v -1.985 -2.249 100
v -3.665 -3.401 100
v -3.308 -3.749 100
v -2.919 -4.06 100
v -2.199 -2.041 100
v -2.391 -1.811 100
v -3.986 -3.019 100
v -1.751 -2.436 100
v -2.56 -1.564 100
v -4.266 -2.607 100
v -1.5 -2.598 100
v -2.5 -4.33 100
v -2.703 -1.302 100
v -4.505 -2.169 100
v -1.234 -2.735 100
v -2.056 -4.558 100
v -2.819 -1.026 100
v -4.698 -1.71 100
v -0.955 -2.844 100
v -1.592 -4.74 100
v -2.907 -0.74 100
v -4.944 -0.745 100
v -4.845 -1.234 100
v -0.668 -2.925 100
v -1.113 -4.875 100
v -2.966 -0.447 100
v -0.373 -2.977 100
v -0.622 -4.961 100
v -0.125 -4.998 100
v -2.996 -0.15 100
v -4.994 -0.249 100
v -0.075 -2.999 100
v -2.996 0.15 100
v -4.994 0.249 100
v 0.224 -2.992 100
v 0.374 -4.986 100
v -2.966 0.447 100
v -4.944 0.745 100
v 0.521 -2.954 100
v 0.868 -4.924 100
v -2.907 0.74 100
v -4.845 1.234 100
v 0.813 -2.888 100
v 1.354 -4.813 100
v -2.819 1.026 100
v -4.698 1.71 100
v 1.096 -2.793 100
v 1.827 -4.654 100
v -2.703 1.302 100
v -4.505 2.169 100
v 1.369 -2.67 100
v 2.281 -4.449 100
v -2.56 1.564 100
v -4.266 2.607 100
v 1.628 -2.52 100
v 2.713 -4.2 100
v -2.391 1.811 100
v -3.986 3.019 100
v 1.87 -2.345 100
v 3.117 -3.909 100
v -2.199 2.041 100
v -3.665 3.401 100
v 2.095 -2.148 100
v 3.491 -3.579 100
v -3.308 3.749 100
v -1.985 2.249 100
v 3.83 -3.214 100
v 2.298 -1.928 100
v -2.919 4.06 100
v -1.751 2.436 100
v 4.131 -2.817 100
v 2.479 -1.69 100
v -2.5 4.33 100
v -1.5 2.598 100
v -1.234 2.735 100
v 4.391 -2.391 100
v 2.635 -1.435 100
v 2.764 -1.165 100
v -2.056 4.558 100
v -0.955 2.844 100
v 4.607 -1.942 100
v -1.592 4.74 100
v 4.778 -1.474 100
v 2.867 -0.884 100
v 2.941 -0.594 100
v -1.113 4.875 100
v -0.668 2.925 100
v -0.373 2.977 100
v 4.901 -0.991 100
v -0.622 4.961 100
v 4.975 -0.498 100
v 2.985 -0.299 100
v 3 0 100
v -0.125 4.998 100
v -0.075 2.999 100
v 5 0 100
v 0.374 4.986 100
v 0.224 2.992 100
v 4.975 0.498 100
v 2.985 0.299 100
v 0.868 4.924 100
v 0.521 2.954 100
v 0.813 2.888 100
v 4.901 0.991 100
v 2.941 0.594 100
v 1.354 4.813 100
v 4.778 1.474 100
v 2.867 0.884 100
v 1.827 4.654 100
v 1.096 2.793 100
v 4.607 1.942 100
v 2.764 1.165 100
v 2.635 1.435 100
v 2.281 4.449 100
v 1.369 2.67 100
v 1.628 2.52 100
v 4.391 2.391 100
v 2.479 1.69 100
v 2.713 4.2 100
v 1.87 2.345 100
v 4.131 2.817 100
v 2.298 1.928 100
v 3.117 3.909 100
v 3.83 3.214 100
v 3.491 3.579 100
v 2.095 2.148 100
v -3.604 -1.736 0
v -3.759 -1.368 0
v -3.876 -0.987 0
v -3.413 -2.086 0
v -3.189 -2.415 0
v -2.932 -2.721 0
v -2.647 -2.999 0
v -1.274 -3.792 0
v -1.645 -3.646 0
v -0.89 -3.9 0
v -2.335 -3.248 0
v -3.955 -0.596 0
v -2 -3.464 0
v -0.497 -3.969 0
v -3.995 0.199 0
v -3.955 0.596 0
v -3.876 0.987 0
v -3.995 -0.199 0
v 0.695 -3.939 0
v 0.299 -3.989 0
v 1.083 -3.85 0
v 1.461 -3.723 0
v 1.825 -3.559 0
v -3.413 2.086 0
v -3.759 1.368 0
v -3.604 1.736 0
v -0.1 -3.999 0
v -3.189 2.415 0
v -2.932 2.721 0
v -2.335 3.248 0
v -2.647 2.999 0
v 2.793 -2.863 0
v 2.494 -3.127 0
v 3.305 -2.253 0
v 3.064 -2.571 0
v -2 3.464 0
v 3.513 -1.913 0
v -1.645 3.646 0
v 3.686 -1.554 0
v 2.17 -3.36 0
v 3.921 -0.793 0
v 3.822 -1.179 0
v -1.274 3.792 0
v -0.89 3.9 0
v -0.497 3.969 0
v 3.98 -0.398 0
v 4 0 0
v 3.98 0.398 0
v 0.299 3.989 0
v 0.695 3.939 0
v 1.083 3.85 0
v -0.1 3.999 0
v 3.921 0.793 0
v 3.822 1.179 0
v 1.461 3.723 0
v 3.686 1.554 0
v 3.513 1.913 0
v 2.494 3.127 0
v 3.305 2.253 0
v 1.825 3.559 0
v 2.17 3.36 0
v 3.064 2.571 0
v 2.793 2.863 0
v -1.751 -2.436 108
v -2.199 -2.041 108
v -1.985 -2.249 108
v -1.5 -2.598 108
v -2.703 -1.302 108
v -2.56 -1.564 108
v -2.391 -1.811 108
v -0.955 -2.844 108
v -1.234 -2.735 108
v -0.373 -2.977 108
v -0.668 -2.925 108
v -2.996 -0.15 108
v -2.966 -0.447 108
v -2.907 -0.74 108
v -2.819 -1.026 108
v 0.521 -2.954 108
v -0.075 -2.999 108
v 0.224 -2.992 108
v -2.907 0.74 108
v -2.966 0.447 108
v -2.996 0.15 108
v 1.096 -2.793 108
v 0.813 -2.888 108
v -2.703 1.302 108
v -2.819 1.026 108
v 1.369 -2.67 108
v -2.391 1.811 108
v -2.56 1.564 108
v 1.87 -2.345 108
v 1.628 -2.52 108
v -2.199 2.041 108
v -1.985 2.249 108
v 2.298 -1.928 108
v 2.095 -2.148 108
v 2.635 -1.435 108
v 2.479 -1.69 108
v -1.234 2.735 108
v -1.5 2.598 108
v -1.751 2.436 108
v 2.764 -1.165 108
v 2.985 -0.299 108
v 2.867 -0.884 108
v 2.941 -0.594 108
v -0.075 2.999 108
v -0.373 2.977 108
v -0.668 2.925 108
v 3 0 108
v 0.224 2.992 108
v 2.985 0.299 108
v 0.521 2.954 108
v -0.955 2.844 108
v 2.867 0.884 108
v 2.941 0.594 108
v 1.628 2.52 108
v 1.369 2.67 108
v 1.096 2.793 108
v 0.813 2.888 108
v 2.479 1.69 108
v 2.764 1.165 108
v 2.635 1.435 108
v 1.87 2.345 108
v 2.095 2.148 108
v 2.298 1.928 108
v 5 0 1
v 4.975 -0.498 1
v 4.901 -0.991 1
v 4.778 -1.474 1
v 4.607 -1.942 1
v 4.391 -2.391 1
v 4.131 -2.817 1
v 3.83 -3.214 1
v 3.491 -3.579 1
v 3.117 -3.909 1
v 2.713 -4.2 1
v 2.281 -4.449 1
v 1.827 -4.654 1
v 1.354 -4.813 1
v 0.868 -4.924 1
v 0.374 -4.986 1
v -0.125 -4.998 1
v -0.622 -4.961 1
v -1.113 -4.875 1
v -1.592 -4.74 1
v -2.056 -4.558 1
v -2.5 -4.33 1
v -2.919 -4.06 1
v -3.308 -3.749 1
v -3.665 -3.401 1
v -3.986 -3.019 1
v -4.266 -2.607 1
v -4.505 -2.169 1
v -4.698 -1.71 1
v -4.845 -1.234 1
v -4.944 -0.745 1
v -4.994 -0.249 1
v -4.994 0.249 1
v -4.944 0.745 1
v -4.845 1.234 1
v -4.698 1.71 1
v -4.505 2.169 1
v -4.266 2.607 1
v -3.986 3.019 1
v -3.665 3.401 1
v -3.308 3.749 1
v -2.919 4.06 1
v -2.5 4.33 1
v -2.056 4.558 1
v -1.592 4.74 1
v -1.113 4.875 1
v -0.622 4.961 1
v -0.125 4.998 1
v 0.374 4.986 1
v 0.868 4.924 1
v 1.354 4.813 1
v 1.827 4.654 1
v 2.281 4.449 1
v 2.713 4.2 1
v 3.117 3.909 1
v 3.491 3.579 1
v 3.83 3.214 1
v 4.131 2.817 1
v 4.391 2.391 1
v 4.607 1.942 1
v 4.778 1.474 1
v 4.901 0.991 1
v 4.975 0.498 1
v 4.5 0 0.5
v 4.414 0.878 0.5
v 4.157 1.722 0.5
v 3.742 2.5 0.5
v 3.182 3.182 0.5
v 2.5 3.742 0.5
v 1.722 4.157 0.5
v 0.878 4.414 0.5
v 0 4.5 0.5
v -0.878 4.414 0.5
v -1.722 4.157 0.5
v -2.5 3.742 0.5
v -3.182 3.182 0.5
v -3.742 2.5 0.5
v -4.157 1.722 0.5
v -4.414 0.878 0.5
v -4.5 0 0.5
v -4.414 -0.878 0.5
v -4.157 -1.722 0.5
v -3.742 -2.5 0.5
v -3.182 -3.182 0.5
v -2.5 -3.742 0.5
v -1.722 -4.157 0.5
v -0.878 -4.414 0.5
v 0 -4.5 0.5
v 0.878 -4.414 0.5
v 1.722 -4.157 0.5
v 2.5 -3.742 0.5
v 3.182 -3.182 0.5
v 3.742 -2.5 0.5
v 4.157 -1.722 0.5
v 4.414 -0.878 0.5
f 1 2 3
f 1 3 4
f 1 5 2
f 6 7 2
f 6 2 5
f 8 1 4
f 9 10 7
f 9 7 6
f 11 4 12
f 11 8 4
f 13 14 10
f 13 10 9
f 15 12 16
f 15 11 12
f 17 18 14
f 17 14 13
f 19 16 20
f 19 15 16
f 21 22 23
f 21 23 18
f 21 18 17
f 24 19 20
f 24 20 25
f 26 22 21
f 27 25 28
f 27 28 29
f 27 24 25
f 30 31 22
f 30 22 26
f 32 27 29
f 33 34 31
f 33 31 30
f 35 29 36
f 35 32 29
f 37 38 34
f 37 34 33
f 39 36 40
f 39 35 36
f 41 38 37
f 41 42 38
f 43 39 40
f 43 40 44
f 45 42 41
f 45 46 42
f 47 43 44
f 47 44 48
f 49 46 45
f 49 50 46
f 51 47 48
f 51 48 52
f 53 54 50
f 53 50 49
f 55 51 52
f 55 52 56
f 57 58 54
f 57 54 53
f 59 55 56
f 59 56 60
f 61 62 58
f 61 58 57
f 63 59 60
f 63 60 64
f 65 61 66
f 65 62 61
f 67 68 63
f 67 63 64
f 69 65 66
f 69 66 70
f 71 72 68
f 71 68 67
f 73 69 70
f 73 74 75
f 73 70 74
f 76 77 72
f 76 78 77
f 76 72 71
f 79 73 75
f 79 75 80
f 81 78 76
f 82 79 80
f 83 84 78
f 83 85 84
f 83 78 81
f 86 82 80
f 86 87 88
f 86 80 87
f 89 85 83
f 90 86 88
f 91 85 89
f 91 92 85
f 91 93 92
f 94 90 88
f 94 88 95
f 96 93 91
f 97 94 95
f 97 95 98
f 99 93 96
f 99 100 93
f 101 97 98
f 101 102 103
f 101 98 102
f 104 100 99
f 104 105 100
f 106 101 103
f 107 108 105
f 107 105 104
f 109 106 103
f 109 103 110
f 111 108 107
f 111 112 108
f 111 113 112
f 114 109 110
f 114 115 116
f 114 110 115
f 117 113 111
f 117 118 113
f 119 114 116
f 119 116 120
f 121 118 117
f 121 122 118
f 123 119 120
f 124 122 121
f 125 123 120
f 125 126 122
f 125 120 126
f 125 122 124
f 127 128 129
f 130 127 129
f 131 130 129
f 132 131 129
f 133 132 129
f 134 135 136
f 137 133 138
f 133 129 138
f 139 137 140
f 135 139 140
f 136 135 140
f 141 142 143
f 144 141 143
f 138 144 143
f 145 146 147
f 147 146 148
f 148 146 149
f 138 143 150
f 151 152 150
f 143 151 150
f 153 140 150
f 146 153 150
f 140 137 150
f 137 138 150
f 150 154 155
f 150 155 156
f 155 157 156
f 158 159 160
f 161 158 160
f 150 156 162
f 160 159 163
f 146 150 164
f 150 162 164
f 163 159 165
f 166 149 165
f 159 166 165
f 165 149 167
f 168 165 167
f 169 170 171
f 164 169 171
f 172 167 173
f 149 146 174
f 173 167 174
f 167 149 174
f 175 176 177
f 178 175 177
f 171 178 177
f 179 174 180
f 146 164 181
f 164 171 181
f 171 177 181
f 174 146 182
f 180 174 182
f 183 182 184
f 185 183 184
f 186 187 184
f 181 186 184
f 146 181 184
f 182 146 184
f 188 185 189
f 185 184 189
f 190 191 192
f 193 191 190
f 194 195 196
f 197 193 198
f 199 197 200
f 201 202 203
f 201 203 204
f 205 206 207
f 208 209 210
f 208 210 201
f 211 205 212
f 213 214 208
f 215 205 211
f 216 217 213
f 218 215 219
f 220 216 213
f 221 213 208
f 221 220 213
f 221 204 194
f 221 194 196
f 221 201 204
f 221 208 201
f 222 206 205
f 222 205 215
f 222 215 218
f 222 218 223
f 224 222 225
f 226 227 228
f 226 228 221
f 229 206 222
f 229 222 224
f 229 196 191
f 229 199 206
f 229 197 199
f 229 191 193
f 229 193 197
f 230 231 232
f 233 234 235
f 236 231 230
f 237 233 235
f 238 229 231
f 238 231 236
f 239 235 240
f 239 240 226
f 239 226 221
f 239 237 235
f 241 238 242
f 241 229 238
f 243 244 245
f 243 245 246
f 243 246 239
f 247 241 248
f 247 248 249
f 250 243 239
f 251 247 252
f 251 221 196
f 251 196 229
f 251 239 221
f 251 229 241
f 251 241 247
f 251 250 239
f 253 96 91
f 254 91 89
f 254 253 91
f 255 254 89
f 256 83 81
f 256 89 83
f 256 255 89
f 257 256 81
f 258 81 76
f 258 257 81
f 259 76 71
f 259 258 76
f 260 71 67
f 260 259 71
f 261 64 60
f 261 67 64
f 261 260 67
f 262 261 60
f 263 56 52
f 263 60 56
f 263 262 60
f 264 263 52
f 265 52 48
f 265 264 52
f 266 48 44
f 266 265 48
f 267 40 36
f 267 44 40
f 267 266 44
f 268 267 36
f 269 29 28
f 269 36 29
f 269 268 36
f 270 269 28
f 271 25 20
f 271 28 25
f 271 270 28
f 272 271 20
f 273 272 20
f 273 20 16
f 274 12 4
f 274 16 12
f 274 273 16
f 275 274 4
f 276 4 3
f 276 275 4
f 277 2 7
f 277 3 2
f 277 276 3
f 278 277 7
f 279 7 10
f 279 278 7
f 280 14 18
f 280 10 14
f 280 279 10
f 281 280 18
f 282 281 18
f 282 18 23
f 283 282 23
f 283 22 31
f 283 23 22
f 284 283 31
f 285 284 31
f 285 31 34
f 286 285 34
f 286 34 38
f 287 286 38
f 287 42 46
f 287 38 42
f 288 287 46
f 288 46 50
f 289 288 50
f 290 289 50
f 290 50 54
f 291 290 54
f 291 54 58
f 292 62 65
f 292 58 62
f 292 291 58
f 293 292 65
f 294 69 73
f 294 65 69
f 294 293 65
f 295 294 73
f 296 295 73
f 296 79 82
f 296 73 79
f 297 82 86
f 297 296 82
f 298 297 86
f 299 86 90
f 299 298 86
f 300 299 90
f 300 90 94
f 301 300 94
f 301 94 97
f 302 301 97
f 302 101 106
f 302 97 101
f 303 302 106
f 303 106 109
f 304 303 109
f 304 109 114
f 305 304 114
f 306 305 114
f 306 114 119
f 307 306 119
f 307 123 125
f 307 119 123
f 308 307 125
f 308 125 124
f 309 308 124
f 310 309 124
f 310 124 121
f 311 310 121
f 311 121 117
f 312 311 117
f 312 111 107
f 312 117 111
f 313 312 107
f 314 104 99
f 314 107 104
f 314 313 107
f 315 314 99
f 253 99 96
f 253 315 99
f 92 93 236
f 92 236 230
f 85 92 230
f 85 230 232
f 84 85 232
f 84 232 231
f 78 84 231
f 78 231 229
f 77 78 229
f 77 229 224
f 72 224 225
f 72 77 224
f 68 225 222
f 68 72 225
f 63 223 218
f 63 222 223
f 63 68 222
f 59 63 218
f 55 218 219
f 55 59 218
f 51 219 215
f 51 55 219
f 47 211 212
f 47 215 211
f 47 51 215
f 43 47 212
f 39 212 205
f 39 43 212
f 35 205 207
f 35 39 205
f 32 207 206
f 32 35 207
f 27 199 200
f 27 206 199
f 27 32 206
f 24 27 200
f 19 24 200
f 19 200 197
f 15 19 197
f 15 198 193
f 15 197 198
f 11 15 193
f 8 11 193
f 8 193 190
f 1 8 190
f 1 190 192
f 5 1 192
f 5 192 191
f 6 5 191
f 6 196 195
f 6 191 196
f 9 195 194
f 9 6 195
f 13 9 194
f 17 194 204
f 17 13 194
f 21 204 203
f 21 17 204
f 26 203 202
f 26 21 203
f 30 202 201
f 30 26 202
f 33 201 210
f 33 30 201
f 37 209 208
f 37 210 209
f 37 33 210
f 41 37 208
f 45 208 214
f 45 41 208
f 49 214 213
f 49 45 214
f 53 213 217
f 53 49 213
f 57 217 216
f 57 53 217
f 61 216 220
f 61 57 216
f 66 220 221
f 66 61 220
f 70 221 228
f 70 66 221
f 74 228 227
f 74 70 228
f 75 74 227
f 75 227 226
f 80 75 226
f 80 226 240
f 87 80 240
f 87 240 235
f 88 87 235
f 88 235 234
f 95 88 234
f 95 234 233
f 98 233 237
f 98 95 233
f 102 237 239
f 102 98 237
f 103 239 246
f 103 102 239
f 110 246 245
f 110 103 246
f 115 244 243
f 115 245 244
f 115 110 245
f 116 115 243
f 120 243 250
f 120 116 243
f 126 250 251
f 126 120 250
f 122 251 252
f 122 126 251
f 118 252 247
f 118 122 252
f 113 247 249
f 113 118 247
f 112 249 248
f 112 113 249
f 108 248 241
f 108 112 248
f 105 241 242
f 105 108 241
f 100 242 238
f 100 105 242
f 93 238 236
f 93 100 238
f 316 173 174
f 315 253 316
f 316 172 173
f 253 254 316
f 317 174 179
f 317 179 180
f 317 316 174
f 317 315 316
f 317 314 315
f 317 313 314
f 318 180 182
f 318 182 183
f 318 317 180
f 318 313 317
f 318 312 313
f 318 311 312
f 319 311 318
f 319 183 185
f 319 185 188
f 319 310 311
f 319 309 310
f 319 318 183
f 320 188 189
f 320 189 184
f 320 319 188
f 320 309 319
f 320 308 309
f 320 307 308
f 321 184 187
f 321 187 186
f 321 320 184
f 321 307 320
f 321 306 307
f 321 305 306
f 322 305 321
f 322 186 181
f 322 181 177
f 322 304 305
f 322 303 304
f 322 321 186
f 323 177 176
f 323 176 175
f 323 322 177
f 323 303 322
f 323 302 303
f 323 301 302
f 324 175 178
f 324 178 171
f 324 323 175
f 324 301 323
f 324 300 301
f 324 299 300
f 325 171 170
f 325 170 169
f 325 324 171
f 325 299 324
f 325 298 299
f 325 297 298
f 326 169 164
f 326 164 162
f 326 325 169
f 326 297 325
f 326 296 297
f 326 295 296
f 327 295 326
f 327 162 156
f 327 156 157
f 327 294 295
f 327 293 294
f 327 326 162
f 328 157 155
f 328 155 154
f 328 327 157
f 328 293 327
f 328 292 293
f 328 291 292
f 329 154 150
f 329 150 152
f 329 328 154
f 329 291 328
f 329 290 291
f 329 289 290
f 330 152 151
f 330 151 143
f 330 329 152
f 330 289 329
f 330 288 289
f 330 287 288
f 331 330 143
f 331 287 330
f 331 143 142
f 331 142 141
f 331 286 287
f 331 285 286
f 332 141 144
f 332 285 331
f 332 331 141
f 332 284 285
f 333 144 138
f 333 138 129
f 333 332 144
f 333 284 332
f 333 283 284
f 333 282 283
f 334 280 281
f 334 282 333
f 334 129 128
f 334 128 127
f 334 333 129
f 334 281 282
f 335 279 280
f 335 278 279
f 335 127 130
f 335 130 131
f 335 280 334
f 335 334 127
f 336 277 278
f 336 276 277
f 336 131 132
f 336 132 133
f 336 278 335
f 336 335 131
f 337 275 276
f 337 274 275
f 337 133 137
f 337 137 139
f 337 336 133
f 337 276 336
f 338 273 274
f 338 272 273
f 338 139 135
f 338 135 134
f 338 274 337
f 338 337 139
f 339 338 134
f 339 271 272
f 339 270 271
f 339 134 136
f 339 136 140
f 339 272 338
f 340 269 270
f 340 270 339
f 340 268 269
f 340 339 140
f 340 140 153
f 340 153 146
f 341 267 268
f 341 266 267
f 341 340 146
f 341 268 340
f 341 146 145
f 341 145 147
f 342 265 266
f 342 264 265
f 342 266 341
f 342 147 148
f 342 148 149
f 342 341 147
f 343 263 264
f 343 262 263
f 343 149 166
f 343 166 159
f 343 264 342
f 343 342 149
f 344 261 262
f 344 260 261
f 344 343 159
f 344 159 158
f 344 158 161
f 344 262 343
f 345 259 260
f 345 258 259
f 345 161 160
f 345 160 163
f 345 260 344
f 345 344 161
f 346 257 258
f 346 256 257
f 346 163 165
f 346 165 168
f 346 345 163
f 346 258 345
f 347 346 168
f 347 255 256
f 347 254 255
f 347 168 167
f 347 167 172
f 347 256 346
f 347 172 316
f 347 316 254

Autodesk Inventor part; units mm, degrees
ref_plane "YZ Plane" through (0, 0, 0) normal (1, 0, 0) x (0, 1, 0)
ref_plane "XZ Plane" through (0, 0, 0) normal (0, 1, 0) x (-1, 0, 0)
ref_plane "XY Plane" through (0, 0, 0) normal (0, 0, 1) x (1, 0, 0)
sketch "Sketch1" plane through (0, 0, 0) normal (0, 0, 1) x (1, 0, 0)
  circle A0 centre (0, 0) radius 5
  dimension "d0" = 10
extrude "Extrusion1" add sketch "Sketch1" along normal blind 100
sketch "Sketch3" plane through (0, 0, 100) normal (0, 0, 1) x (1, 0, 0)
  circle A0 centre (0, 0) radius 5 projected
  circle A1 centre (0, 0) radius 3
  dimension "d3" = 6
extrude "Extrusion2" add sketch "Sketch3" along normal blind 8 contours A1
thread "Thread1" size "M6x1" class "6g" standard "ANSI Metric M Profile" full length
chamfer "Chamfer1" distance 1 angle 45 1 edges at (-5, 0, 0)
properties part number "rod"
